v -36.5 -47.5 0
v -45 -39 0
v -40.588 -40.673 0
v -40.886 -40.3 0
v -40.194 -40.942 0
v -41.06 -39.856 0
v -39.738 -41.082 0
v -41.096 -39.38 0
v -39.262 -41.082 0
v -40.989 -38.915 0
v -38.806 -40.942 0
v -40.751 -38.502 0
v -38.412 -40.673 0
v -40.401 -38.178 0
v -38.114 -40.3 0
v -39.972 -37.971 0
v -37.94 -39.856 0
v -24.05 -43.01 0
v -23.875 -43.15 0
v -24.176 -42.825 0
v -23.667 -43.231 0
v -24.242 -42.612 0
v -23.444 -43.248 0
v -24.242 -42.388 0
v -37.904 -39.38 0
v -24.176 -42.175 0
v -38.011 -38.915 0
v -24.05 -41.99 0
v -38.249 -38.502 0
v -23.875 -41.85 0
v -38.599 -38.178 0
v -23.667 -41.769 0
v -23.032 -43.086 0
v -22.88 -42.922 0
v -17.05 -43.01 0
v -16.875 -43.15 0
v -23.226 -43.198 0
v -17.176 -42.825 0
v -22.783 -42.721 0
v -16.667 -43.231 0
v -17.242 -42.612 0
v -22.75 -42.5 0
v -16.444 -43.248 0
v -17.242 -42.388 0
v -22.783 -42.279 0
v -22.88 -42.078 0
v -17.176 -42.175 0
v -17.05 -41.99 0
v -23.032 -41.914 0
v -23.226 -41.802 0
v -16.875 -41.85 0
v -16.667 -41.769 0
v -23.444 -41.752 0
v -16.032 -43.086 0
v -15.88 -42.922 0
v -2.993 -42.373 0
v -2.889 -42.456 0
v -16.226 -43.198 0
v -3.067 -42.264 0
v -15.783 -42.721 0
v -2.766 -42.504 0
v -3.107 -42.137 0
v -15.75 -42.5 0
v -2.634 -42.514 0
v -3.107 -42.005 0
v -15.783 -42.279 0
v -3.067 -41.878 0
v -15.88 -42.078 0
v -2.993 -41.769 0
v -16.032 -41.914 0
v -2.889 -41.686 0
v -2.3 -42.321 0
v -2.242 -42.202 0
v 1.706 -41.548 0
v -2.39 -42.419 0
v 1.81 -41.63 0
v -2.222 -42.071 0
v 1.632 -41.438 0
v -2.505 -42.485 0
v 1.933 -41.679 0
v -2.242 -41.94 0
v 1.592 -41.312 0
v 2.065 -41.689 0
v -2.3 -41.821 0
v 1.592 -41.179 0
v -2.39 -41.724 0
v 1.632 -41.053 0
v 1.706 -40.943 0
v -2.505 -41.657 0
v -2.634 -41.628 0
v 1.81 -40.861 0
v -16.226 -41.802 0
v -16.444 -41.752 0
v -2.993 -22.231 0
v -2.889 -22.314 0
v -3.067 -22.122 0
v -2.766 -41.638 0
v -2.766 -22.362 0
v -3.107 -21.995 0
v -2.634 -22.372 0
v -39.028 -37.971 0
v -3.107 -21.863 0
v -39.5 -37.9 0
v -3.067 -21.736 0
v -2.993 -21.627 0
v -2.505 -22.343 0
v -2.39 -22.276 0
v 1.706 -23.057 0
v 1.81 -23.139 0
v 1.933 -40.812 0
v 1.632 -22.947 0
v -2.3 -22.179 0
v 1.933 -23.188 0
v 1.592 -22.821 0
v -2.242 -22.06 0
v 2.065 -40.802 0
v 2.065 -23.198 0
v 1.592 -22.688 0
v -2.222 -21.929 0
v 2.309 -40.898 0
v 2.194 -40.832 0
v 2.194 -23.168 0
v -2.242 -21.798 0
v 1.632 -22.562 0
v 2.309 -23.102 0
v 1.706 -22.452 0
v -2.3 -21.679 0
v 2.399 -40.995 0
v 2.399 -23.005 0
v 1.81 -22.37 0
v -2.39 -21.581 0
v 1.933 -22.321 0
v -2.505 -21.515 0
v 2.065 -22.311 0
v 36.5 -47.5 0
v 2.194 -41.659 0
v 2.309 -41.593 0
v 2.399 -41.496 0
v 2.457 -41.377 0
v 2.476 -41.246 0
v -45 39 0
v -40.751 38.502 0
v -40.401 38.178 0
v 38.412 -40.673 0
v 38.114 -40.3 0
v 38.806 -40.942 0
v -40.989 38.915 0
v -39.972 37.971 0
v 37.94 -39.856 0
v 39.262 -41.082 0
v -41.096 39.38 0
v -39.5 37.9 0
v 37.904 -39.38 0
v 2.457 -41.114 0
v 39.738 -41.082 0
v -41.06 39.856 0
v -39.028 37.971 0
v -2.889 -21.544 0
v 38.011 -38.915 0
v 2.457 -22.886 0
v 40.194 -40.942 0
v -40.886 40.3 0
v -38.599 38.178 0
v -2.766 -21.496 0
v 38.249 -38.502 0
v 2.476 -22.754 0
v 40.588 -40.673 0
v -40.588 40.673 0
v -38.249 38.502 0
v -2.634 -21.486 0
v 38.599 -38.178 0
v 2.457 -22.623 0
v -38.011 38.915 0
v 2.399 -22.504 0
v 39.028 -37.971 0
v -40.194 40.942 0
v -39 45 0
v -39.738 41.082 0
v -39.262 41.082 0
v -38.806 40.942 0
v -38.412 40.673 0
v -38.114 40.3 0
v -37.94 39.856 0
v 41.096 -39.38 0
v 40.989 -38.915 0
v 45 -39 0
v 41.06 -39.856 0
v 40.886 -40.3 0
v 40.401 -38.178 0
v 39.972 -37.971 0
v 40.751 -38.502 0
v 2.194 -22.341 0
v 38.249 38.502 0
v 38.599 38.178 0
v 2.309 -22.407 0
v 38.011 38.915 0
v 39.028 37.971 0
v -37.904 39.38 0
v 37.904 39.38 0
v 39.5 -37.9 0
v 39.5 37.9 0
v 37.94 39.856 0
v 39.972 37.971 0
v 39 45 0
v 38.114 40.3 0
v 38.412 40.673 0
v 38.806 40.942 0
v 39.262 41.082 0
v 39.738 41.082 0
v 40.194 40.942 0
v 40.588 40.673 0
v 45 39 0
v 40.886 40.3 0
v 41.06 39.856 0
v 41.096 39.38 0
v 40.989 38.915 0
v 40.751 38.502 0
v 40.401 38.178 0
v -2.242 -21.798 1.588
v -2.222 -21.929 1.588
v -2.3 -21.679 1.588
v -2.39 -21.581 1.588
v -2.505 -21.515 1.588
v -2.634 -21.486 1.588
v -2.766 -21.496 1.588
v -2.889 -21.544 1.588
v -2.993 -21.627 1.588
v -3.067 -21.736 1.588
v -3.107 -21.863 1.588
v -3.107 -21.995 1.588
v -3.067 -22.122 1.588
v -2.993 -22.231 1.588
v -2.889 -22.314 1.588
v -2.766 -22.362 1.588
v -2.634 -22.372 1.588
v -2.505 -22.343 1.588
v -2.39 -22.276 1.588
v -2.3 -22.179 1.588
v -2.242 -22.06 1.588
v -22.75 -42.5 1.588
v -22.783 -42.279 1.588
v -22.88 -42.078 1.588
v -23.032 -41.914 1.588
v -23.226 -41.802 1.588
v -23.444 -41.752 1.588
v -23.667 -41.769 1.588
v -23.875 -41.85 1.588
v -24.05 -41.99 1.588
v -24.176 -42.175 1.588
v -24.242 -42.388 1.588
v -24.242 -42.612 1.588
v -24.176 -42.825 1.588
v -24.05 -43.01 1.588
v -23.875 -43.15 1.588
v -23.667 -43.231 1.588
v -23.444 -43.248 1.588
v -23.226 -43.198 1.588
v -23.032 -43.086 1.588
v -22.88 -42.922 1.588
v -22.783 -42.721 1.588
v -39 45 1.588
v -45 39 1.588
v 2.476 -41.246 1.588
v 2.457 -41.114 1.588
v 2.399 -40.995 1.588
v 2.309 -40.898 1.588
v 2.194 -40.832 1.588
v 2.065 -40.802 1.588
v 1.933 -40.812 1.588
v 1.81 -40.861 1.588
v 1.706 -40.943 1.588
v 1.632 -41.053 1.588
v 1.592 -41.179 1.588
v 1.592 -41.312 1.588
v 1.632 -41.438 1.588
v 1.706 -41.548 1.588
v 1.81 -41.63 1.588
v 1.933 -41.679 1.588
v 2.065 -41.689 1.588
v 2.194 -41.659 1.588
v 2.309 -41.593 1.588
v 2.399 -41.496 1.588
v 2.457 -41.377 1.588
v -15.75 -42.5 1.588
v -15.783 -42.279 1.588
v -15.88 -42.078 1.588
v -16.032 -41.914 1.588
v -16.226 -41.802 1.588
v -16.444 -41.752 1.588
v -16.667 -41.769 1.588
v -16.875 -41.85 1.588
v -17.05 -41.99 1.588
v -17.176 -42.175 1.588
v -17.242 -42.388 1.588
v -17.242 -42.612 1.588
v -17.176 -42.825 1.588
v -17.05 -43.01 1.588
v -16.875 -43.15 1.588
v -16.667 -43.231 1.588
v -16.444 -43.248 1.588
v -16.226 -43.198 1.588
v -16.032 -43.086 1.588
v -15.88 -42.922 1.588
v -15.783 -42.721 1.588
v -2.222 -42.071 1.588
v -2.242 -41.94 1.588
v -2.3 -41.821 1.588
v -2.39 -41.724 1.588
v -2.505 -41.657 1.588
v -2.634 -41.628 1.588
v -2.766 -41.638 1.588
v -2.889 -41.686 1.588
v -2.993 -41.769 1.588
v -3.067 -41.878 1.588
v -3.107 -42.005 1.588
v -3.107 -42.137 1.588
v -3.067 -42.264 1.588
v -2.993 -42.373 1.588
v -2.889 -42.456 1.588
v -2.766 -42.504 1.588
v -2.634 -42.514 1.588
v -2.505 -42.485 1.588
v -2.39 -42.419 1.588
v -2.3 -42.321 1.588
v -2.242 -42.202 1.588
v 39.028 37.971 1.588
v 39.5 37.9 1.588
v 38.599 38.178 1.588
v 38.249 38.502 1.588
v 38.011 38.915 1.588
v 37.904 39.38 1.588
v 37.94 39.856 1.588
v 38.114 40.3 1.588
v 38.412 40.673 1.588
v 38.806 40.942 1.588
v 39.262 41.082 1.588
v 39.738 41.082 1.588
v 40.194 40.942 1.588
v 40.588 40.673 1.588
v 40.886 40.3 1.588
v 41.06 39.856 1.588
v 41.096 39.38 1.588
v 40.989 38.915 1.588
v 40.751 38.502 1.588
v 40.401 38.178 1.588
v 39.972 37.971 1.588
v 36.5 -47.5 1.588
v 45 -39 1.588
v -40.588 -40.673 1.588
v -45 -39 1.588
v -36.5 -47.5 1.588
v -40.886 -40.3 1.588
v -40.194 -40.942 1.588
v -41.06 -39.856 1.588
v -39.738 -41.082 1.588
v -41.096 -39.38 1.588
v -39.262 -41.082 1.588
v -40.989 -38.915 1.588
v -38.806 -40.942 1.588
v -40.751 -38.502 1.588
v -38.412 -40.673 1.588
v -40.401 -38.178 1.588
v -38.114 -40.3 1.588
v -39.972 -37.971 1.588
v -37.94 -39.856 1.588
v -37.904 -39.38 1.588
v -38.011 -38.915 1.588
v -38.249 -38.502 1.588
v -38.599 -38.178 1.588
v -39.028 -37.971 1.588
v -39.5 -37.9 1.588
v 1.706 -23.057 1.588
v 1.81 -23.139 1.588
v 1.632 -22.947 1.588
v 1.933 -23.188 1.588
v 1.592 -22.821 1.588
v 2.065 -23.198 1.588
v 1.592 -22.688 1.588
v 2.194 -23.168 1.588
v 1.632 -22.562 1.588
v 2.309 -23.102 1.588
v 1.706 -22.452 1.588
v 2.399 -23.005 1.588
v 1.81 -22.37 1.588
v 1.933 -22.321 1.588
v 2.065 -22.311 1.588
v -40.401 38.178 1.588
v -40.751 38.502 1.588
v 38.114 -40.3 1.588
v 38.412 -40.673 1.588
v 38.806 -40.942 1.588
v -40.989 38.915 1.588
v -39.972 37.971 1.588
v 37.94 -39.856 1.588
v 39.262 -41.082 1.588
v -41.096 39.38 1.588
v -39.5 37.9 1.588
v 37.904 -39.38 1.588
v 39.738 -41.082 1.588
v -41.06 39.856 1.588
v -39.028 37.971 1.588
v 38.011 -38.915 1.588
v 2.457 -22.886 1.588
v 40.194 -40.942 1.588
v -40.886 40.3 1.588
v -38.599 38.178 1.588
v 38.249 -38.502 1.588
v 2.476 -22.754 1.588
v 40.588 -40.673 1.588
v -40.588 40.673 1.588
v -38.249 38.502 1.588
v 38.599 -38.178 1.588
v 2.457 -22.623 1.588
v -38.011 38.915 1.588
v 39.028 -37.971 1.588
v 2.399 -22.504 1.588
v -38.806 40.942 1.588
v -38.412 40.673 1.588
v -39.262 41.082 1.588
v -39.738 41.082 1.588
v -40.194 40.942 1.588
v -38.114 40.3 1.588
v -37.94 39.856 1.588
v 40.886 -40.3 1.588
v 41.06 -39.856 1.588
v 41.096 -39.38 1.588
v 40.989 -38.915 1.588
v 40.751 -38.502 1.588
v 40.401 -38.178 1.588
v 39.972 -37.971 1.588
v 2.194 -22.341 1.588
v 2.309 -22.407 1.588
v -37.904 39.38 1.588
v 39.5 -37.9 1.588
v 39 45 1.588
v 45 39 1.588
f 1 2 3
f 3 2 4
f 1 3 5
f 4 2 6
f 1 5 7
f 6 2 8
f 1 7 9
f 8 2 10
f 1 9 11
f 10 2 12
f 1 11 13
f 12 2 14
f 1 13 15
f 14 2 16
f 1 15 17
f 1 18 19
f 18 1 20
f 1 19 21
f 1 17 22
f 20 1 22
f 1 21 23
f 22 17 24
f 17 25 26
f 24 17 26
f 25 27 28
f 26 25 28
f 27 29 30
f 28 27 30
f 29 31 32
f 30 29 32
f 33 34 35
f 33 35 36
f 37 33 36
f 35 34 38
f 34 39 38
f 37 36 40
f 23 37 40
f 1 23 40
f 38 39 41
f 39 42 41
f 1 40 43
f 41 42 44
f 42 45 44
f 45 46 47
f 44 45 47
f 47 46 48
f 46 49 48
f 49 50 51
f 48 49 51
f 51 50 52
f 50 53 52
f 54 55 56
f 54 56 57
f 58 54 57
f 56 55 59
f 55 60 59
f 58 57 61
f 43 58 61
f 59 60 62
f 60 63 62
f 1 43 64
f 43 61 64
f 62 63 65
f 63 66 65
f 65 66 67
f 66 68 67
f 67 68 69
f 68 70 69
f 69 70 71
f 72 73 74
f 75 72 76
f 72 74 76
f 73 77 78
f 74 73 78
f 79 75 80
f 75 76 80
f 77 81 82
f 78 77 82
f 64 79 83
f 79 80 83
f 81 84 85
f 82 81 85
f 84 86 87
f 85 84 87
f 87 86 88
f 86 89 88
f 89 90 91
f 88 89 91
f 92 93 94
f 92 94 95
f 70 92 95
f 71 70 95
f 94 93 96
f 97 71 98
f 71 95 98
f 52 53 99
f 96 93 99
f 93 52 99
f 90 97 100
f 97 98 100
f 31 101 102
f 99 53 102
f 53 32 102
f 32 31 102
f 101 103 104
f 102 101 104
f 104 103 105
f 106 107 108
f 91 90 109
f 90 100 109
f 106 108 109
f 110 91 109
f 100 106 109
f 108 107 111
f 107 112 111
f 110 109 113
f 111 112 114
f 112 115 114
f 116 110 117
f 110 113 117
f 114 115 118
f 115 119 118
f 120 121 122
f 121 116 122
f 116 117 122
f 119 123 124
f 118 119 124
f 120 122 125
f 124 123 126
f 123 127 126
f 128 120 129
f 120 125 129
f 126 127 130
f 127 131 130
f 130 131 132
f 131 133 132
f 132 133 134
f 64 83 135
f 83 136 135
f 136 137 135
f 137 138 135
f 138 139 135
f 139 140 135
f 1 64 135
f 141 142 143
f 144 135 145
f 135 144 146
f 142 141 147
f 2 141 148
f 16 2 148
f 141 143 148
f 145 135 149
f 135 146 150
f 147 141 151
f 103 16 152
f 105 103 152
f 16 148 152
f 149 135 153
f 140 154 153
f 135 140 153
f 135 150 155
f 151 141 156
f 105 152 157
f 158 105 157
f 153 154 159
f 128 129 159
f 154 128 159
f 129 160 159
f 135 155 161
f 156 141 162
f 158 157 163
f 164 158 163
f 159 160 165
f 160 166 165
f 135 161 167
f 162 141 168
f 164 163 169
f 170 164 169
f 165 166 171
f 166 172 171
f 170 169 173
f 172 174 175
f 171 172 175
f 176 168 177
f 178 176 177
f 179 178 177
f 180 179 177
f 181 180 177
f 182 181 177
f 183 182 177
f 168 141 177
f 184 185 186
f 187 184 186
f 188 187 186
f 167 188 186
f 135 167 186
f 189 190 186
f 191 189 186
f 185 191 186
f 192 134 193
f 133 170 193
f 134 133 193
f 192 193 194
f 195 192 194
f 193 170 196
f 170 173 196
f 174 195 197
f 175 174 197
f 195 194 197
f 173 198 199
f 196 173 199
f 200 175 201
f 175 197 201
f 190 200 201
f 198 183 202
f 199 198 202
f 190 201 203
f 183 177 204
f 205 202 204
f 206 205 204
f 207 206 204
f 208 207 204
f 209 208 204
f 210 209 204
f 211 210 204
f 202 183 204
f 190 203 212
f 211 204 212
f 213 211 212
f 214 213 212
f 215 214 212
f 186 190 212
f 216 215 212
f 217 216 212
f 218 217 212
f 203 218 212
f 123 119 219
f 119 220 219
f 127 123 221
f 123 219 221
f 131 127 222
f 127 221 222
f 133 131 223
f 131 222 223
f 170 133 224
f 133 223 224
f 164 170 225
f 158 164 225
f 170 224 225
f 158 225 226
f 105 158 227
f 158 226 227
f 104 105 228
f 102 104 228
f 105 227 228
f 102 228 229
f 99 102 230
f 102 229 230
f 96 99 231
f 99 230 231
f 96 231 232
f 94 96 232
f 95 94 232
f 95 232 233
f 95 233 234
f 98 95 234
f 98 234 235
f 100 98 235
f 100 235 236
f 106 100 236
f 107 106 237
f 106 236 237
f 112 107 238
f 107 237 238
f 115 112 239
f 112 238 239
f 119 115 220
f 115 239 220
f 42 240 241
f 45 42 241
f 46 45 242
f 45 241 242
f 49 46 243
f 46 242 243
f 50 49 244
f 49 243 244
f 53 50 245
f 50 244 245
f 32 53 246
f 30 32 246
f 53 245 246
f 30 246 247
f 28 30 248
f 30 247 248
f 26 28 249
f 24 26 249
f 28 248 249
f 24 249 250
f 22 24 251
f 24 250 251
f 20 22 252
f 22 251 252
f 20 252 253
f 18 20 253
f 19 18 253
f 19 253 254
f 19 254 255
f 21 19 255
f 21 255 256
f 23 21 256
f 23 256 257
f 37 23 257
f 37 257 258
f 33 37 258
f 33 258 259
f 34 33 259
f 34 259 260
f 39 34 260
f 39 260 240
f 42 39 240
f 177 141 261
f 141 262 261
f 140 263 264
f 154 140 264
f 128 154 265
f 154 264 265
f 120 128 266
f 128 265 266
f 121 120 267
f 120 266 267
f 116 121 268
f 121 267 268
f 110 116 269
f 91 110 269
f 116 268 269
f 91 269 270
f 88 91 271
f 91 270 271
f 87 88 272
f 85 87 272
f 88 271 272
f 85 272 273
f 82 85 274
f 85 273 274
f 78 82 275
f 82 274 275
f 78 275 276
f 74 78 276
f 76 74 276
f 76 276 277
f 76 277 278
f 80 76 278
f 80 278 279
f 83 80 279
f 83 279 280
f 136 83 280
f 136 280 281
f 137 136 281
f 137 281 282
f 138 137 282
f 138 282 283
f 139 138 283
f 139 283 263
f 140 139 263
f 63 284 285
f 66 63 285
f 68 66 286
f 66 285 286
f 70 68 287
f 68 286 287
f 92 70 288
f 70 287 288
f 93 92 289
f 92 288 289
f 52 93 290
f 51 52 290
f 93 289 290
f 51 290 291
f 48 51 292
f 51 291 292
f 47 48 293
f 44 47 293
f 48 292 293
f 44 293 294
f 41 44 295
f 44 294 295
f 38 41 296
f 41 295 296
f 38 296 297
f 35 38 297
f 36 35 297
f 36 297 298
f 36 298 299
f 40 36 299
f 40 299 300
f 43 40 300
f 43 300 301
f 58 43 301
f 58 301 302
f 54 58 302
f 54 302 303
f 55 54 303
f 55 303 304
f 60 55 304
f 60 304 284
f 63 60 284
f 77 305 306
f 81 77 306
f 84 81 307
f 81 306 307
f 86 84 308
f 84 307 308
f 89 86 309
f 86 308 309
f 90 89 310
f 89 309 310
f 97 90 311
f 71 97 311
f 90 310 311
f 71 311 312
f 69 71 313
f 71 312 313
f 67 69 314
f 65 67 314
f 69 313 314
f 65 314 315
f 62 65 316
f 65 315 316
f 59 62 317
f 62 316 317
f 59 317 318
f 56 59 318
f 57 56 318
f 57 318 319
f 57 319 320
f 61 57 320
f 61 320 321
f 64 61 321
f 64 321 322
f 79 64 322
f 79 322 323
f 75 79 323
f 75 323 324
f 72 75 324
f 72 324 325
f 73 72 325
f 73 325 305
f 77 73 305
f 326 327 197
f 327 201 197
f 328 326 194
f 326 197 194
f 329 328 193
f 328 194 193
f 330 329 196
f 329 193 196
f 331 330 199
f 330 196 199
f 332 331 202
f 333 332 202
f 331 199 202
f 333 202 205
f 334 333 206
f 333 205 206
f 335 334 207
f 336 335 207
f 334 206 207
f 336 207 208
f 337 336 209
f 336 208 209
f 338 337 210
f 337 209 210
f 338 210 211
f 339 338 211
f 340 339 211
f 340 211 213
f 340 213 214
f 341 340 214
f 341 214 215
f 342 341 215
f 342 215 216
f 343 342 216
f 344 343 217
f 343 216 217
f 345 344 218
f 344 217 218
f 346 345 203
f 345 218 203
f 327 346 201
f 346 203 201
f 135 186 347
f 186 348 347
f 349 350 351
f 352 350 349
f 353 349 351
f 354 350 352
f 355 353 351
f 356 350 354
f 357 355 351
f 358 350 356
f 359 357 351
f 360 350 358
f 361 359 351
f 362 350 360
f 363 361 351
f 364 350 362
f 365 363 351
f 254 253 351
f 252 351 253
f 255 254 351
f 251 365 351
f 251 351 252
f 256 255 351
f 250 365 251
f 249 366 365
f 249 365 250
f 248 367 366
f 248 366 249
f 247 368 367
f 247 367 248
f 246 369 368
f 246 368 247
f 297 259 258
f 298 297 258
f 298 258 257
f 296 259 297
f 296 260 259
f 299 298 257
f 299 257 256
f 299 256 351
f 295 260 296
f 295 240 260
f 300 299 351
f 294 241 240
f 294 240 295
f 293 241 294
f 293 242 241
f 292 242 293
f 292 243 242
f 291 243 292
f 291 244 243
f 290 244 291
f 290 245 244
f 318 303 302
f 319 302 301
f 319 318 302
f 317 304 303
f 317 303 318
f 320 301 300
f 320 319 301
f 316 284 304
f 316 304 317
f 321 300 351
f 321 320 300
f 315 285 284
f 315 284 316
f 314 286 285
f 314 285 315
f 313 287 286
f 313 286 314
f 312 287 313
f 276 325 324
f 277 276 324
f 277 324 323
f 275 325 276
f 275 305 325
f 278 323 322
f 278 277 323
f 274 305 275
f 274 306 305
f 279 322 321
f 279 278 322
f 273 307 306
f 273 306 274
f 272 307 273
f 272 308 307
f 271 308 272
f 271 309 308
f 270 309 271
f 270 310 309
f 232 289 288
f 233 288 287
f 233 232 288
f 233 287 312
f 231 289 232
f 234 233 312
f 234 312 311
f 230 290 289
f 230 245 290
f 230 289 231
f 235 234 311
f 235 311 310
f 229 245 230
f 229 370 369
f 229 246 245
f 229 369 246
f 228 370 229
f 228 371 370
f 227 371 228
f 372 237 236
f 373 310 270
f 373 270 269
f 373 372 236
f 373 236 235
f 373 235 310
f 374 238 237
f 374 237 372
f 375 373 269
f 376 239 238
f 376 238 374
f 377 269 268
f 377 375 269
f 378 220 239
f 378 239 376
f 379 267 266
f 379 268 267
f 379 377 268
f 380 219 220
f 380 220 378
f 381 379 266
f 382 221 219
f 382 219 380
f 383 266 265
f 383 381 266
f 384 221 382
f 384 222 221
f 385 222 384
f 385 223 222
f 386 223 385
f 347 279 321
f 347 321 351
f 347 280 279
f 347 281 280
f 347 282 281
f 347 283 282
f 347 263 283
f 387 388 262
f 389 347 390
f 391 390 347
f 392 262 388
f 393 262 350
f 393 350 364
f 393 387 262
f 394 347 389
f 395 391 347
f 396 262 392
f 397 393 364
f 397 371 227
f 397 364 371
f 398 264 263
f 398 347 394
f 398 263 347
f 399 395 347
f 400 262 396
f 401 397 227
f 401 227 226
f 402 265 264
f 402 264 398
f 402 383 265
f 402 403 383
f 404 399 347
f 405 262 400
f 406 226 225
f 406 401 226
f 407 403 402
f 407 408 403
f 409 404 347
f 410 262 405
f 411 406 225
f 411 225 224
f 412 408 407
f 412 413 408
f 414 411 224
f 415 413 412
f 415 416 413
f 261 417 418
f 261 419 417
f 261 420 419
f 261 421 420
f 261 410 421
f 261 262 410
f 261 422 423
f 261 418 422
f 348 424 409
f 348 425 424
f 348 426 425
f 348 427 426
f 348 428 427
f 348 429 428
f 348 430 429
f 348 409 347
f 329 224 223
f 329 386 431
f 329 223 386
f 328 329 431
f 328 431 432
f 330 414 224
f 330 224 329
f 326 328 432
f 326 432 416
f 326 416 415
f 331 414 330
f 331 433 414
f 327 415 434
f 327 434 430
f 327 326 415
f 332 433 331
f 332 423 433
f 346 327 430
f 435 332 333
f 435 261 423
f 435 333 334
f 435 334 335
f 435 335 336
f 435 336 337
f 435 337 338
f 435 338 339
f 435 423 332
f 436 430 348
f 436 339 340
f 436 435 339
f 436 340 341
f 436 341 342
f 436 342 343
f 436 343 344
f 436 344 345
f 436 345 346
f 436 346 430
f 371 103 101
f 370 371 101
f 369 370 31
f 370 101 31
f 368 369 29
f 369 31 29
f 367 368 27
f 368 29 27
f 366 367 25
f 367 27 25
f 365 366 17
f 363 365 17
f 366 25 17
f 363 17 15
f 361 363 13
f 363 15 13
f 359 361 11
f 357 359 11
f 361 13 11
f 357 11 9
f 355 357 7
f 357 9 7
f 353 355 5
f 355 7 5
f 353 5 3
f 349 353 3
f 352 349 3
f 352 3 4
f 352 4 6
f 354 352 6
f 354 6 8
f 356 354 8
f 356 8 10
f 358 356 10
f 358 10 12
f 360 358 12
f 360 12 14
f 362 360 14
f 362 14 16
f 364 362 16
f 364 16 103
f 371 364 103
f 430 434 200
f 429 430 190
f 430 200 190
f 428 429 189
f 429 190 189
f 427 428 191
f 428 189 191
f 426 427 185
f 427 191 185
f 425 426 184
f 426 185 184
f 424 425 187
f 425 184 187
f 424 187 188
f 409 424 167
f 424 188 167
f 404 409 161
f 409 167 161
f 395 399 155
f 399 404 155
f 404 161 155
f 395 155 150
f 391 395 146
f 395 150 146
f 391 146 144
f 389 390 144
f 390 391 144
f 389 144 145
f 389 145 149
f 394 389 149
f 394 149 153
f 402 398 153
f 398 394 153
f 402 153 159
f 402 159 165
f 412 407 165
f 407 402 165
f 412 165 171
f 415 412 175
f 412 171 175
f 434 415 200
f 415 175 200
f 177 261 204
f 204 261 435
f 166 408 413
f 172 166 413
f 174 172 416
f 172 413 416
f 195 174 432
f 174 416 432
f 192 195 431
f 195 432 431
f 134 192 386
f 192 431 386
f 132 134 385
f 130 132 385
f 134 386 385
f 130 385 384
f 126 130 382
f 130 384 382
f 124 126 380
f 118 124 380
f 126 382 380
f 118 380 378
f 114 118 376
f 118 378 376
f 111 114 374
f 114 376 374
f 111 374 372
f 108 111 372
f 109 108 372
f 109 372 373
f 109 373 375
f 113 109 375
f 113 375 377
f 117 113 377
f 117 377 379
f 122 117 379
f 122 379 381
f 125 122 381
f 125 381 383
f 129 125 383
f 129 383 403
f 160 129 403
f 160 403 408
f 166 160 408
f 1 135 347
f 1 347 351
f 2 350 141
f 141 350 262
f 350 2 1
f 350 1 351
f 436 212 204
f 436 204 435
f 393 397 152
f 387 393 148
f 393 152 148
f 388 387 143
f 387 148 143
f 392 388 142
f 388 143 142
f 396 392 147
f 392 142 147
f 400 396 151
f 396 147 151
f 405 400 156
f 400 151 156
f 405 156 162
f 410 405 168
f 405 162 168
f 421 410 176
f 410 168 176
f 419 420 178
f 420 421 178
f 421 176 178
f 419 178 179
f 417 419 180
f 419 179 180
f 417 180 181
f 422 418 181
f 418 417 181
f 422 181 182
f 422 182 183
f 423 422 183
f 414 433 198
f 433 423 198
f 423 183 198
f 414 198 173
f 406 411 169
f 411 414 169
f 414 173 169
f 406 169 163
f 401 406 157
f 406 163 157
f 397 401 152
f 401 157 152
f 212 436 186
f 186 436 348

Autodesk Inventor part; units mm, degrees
sketch "AL_spacer_contact_Zminus" plane through (0, 0, 0) normal (0, 0, 1) x (1, 0, 0)
  circle A0 centre (39.5, 39.5) radius 3.175
  circle A1 centre (39.5, -39.5) radius 3.175
  circle A2 centre (-39.5, -39.5) radius 3.175
  circle A3 centre (-39.5, 39.5) radius 3.175
  point P0 (0, 0)
  dimension "d228" = 39.5
  dimension "d229" = 39.5
  dimension "d230" = 39.5
  dimension "d231" = 39.5
  dimension "d232" = 39.5
  dimension "d233" = 39.5
  dimension "d234" = 39.5
  dimension "d235" = 39.5
  dimension "d236" = 6.35
sketch "Delrin_stayout_Zminus" plane through (0, 0, 0) normal (0, 0, 1) x (1, 0, 0)
  line L0 (47.5, 39.5) -> (47.5, 31)
  line L1 (47.5, 31) -> (39.5, 31)
  line L2 (39.5, 31) -> (31, 39.5)
  line L3 (31, 39.5) -> (31, 47.5)
  line L4 (31, 47.5) -> (39.5, 47.5)
  line L5 (39.5, 47.5) -> (47.5, 39.5)
  line L6 (-39.5, 47.5) -> (-47.5, 39.5)
  line L7 (-47.5, 39.5) -> (-47.5, 31)
  line L8 (-47.5, 31) -> (-39.5, 31)
  line L9 (-39.5, 31) -> (-31, 39.5)
  line L10 (-31, 39.5) -> (-31, 47.5)
  line L11 (-31, 47.5) -> (-39.5, 47.5)
  line L12 (47.5, -39.5) -> (39.5, -47.5)
  line L13 (39.5, -47.5) -> (31, -47.5)
  line L14 (31, -47.5) -> (31, -39.5)
  line L15 (31, -39.5) -> (39.5, -31)
  line L16 (39.5, -31) -> (47.5, -31)
  line L17 (47.5, -31) -> (47.5, -39.5)
  line L18 (-39.5, -47.5) -> (-47.5, -39.5)
  line L19 (-47.5, -39.5) -> (-47.5, -31)
  line L20 (-47.5, -31) -> (-39.5, -31)
  line L21 (-39.5, -31) -> (-31, -39.5)
  line L22 (-31, -39.5) -> (-31, -47.5)
  line L23 (-31, -47.5) -> (-39.5, -47.5)
  point P0 (0, 0)
  dimension "d243" = 16.5
  dimension "d244" = 8
  dimension "d245" = 8.5
  dimension "d246" = 16.5
  dimension "d247" = 47.5
  dimension "d248" = 47.5
  dimension "d249" = 47.5
  dimension "d250" = 47.5
  dimension "d251" = 47.5
  dimension "d252" = 47.5
  dimension "d253" = 47.5
  dimension "d254" = 47.5
sketch "Nub_stayout_Zminus" plane through (0, 0, 0) normal (0, 0, 1) x (1, 0, 0)
  line L0 (29, 47.5) -> (39.5, 47.5)
  line L1 (39.5, 47.5) -> (47.5, 39.5)
  line L2 (47.5, 39.5) -> (47.5, 29)
  line L3 (47.5, 29) -> (42, 29)
  line L4 (42, 29) -> (42, 40.4125)
  line L5 (40.4125, 42) -> (29, 42)
  line L6 (29, 42) -> (29, 47.5)
  arc A0 (42, 40.4125) -> (40.4125, 42) centre (40.4125, 40.4125) ccw
  line L7 (-29, 47.5) -> (-39.5, 47.5)
  line L8 (-39.5, 47.5) -> (-47.5, 39.5)
  line L9 (-47.5, 39.5) -> (-47.5, 29)
  line L10 (-47.5, 29) -> (-42, 29)
  line L11 (-42, 29) -> (-42, 40.4125)
  line L12 (-40.4125, 42) -> (-29, 42)
  line L13 (-29, 42) -> (-29, 47.5)
  arc A1 (-40.4125, 42) -> (-42, 40.4125) centre (-40.4125, 40.4125) ccw
  line L14 (-47.5, -29) -> (-42, -29)
  line L15 (-42, -29) -> (-42, -40.4125)
  line L16 (-40.4125, -42) -> (-29, -42)
  line L17 (-29, -42) -> (-29, -47.5)
  line L18 (-29, -47.5) -> (-39.5, -47.5)
  line L19 (-39.5, -47.5) -> (-47.5, -39.5)
  line L20 (-47.5, -39.5) -> (-47.5, -29)
  arc A2 (-42, -40.4125) -> (-40.4125, -42) centre (-40.4125, -40.4125) ccw
  line L21 (47.5, -29) -> (42, -29)
  line L22 (42, -29) -> (42, -40.4125)
  line L23 (40.4125, -42) -> (29, -42)
  line L24 (29, -42) -> (29, -47.5)
  line L25 (29, -47.5) -> (39.5, -47.5)
  line L26 (39.5, -47.5) -> (47.5, -39.5)
  line L27 (47.5, -39.5) -> (47.5, -29)
  arc A3 (40.4125, -42) -> (42, -40.4125) centre (40.4125, -40.4125) ccw
  point P0 (0, 0)
  dimension "d255" = 1.5875
  dimension "d256" = 18.5
  dimension "d257" = 8
  dimension "d258" = 5.5
  dimension "d259" = 47.5
  dimension "d260" = 47.5
  dimension "d264" = 1.5875
  dimension "d265" = 47.5
  dimension "d266" = 47.5
  dimension "d267" = 1.5875
  dimension "d268" = 47.5
  dimension "d269" = 47.5
  dimension "d270" = 1.5875
  dimension "d271" = 47.5
  dimension "d272" = 47.5
ref_plane "Zplus_face" through (0, 0, 1.5875) normal (0, 0, 1) x (1, 0, 0)
sketch "AL_spacer_contact_Zplus" plane through (0, 0, 1.5875) normal (0, 0, 1) x (1, 0, 0)
  circle A0 centre (-39.5, 39.5) radius 3.175
  circle A1 centre (-39.5, -39.5) radius 3.175
  circle A2 centre (39.5, -39.5) radius 3.175
  circle A3 centre (39.5, 39.5) radius 3.175
  point P0 (0, 0)
  dimension "d129" = 39.5
  dimension "d130" = 39.5
  dimension "d131" = 39.5
  dimension "d132" = 39.5
  dimension "d133" = 6.35
sketch "Delrin_stayout_Zplus" plane through (0, 0, 1.5875) normal (0, 0, 1) x (1, 0, 0)
  line L0 (47.5, -31) -> (47.5, -39.5)
  line L1 (47.5, -39.5) -> (39.5, -47.5)
  line L2 (39.5, -47.5) -> (31, -47.5)
  line L3 (31, -47.5) -> (31, -39.5)
  line L4 (31, -39.5) -> (39.5, -31)
  line L5 (39.5, -31) -> (47.5, -31)
  line L6 (47.5, 31) -> (47.5, 39.5)
  line L7 (47.5, 39.5) -> (39.5, 47.5)
  line L8 (39.5, 47.5) -> (31, 47.5)
  line L9 (31, 47.5) -> (31, 39.5)
  line L10 (31, 39.5) -> (39.5, 31)
  line L11 (39.5, 31) -> (47.5, 31)
  line L12 (-39.5, 47.5) -> (-47.5, 39.5)
  line L13 (-47.5, 39.5) -> (-47.5, 31)
  line L14 (-47.5, 31) -> (-39.5, 31)
  line L15 (-39.5, 31) -> (-31, 39.5)
  line L16 (-31, 39.5) -> (-31, 47.5)
  line L17 (-31, 47.5) -> (-39.5, 47.5)
  line L18 (-47.5, -39.5) -> (-39.5, -47.5)
  line L19 (-39.5, -47.5) -> (-31, -47.5)
  line L20 (-31, -47.5) -> (-31, -39.5)
  line L21 (-31, -39.5) -> (-39.5, -31)
  line L22 (-39.5, -31) -> (-47.5, -31)
  line L23 (-47.5, -31) -> (-47.5, -39.5)
  point P0 (0, 0)
  dimension "d115" = 16.5
  dimension "d116" = 16.5
  dimension "d117" = 8
  dimension "d118" = 8.5
  dimension "d121" = 47.5
  dimension "d122" = 47.5
  dimension "d123" = 47.5
  dimension "d124" = 47.5
  dimension "d125" = 47.5
  dimension "d126" = 47.5
  dimension "d127" = 47.5
  dimension "d128" = 47.5
sketch "Nub_stayout_Zplus" plane through (0, 0, 1.5875) normal (0, 0, 1) x (1, 0, 0)
  line L0 (47.5, 29) -> (42, 29)
  line L1 (42, 29) -> (42, 40.4125)
  line L2 (40.4125, 42) -> (29, 42)
  line L3 (29, 42) -> (29, 47.5)
  arc A0 (42, 40.4125) -> (40.4125, 42) centre (40.4125, 40.4125) ccw
  line L4 (29, 47.5) -> (39.5, 47.5)
  line L5 (39.5, 47.5) -> (47.5, 39.5)
  line L6 (47.5, 39.5) -> (47.5, 29)
  line L7 (-39.5, 47.5) -> (-29, 47.5)
  line L8 (-29, 47.5) -> (-29, 42)
  line L9 (-29, 42) -> (-40.4125, 42)
  line L10 (-42, 40.4125) -> (-42, 29)
  line L11 (-42, 29) -> (-47.5, 29)
  line L12 (-47.5, 29) -> (-47.5, 39.5)
  line L13 (-47.5, 39.5) -> (-39.5, 47.5)
  arc A1 (-40.4125, 42) -> (-42, 40.4125) centre (-40.4125, 40.4125) ccw
  line L14 (-47.5, -29) -> (-47.5, -39.5)
  line L15 (-47.5, -39.5) -> (-39.5, -47.5)
  line L16 (-39.5, -47.5) -> (-29, -47.5)
  line L17 (-29, -47.5) -> (-29, -42)
  line L18 (-29, -42) -> (-40.4125, -42)
  line L19 (-42, -40.4125) -> (-42, -29)
  line L20 (-42, -29) -> (-47.5, -29)
  arc A2 (-42, -40.4125) -> (-40.4125, -42) centre (-40.4125, -40.4125) ccw
  line L21 (29, -47.5) -> (39.5, -47.5)
  line L22 (39.5, -47.5) -> (47.5, -39.5)
  line L23 (47.5, -39.5) -> (47.5, -29)
  line L24 (47.5, -29) -> (42, -29)
  line L25 (42, -29) -> (42, -40.4125)
  line L26 (40.4125, -42) -> (29, -42)
  line L27 (29, -42) -> (29, -47.5)
  arc A3 (40.4125, -42) -> (42, -40.4125) centre (40.4125, -40.4125) ccw
  point P0 (0, 0)
  dimension "d146" = 1.5875
  dimension "d147" = 5.5
  dimension "d149" = 18.5
  dimension "d150" = 8
  dimension "d151" = 47.5
  dimension "d152" = 47.5
  dimension "d153" = 1.5875
  dimension "d154" = 47.5
  dimension "d155" = 47.5
  dimension "d156" = 1.5875
  dimension "d157" = 47.5
  dimension "d158" = 47.5
  dimension "d159" = 1.5875
  dimension "d160" = 47.5
  dimension "d161" = 47.5
sketch "Sketch1" plane through (0, 0, 0) normal (0, 0, 1) x (1, 0, 0)
  line L0 (-47.5, 47.5) -> (47.5, 47.5)
  line L1 (47.5, 47.5) -> (47.5, -47.5)
  line L2 (47.5, -47.5) -> (-47.5, -47.5)
  line L3 (-47.5, -47.5) -> (-47.5, 47.5)
  point P0 (0, 0)
  dimension "d0" = 95
  dimension "d1" = 95
  dimension "d2" = 47.5
  dimension "d3" = 47.5
extrude "Extrusion1" add sketch "Sketch1" along normal blind 1.5875
chamfer "Chamfer2" distance 11 angle 45 2 edges at (-47.5, -47.5, 0.7937) (47.5, 47.5, 0.7937)
ref_plane "Work Plane_ConnX" through (-32, 0, 0) normal (1, 0, 0) x (0, 1, 0)
ref_plane "Work Plane_ConnY" through (0, 0, 0) normal (0, 1, 0) x (-1, 0, 0)
sketch "Sketch9" plane through (0, 0, 1.5875) normal (0, 0, 1) x (1, 0, 0)
  line L0 (47.5, 47.5) -> (47.5, -47.5) projected
  line L1 (58.5598, -32) -> (-58.5598, -32)
  circle A0 centre (-2.667, -21.9289) radius 0.4445
  circle A1 centre (-2.667, -42.0711) radius 0.4445
  line L2 (0, 26.5598) -> (0, -90.5598) construction
  point P0 (0, 0)
  point P1 (0, -32)
  dimension "d134" = 20.1422
  dimension "d136" = 2.667
  dimension "d138" = 0.889
  dimension "d141" = 180
  dimension "d350" = 32
  dimension "d351" = 0
extrude "Holes_Conn_Zminus" cut sketch "Sketch9" against normal through all
sketch "Sketch22" plane through (0, 0, 1.5875) normal (0, 0, 1) x (1, 0, 0)
  line L0 (47.5, 36.5) -> (47.5, -47.5) projected
  line L1 (0, -1.0026) -> (0, -62.9974) construction
  line L2 (62.8115, -32) -> (-62.8115, -32)
  circle A0 centre (2.032, -22.7545) radius 0.4445
  circle A1 centre (2.032, -41.2455) radius 0.4445
  point P0 (47.5, -36.5)
  point P1 (0, 0)
  point P2 (0, -32)
  dimension "d282" = 180
  dimension "d283" = 18.491
  dimension "d284" = 0.889
  dimension "d285" = 2.032
  dimension "d352" = 32
  dimension "d353" = 0
extrude "Holes_Conn_Zplus" cut sketch "Sketch22" against normal through all
hole "Hole5" at (39.5, 39.5, 1.5875) direction (0, 0, -1) diameter 3.2 end through all
mirror "Mirror5" about plane through (0, 0, 0) normal (1, 0, 0) of "Hole5"
mirror "Mirror6" about plane through (0, 0, 0) normal (0, 1, 0) of "Hole5", "Mirror5"
sketch "Sketch25" plane through (0, 0, 1.5875) normal (0, 0, 1) x (1, 0, 0)
  circle A0 centre (-39.5, -39.5) radius 1.6 projected
  circle A1 centre (39.5, -39.5) radius 1.6 projected
  circle A2 centre (-39.5, 39.5) radius 1.6 projected
  circle A3 centre (39.5, 39.5) radius 1.6 projected
  line L0 (47.5, -47.5) -> (-36.5, -47.5) projected
  line L1 (0, 0) -> (0, -59.2198)
  line L2 (8, -47.5) -> (8, -15.5)
  line L3 (8, -15.5) -> (-8, -15.5)
  line L4 (-8, -15.5) -> (-8, -47.5)
  line L5 (-8, -47.5) -> (-62.7516, -61.7336)
  line L6 (-62.7516, -61.7336) -> (-64.2933, 68.2222)
  line L7 (-64.2933, 68.2222) -> (58.3572, 62.5728)
  line L8 (58.3572, 62.5728) -> (56.5848, -69.017)
  line L9 (56.5848, -69.017) -> (8, -47.5)
  point P0 (36.5, -47.5)
  dimension "d362" = 16
  dimension "d363" = 32
extrude "Extrusion9" [suppressed]
sketch "Sketch26" plane through (0, 0, 1.5875) normal (0, 0, 1) x (1, 0, 0)
  line L0 (47.5, -47.5) -> (-36.5, -47.5) projected
  circle A0 centre (-23.5, -42.5) radius 0.75
  circle A1 centre (-16.5, -42.5) radius 0.75
  line L1 (-20, -36.5) -> (-20, -45.5063)
  point P0 (36.5, -47.5)
  point P1 (0, 0)
  point P2 (-20, -42.5)
  dimension "d366" = 1.5
  dimension "d367" = 7
  dimension "d368" = 5
  dimension "d369" = 20
extrude "Extrusion10" cut sketch "Sketch26" against normal through all
sketch "Sketch27" plane through (0, 0, 1.5875) normal (0, 0, 1) x (1, 0, 0)
  line L0 (47.5, -47.5) -> (47, -47.5)
  line L1 (47, -47.5) -> (47, -40.5)
  line L2 (47.5, -39.338) -> (47.5, -47.5)
  arc A0 (47.5, -39.338) -> (47, -40.5) centre (48.6002, -40.5) ccw
  line L3 (-47.5, 47.5) -> (-47, 47.5)
  line L4 (-47, 47.5) -> (-47, 40.5)
  line L5 (-47.5, 39.338) -> (-47.5, 47.5)
  arc A1 (-47.5, 39.338) -> (-47, 40.5) centre (-48.6002, 40.5) ccw
  point P0 (0, 0)
  dimension "d372" = 1.6002
  dimension "d373" = 0.5
  dimension "d374" = 7
extrude "Extrusion11" cut sketch "Sketch27" against normal through all
chamfer "Chamfer4" [suppressed]
sketch "Sketch37" plane through (0, 0, 1.5875) normal (0, 0, 1) x (1, 0, 0)
  line L0 (-47.5, -36.5) -> (-47.5, 39.338) projected
  line L1 (47, -47.5) -> (-36.5, -47.5) projected
  line L2 (47.5, 36.5) -> (47.5, -39.338) projected
  line L3 (-47, 47.5) -> (36.5, 47.5) projected
  line L4 (-47.5, 47.5) -> (47.5, 47.5) construction
  line L5 (47.5, 47.5) -> (47.5, -47.5) construction
  line L6 (47.5, -47.5) -> (-47.5, -47.5) construction
  line L7 (-47.5, -47.5) -> (-47.5, 47.5) construction
  point P0 (0, 0)
decal "Decal4"
sketch "Sketch38" plane through (0, 0, 0) normal (0, 0, -1) x (-1, 0, 0)
  line L0 (47, 47.5) -> (-36.5, 47.5) projected
  line L1 (-47.5, 36.5) -> (-47.5, -39.338) projected
  line L2 (-47, -47.5) -> (36.5, -47.5) projected
  line L3 (47.5, -36.5) -> (47.5, 39.338) projected
  line L4 (-47.5, 47.5) -> (47.5, 47.5) construction
  line L5 (47.5, 47.5) -> (47.5, -47.5) construction
  line L6 (47.5, -47.5) -> (-47.5, -47.5) construction
  line L7 (-47.5, -47.5) -> (-47.5, 47.5) construction
  point P0 (0, 0)
decal "Decal5"
sketch "Sketch34" plane through (0, 0, 1.5875) normal (0, 0, 1) x (1, 0, 0)
  arc A0 (-47.5, 39.338) -> (-47, 40.5) centre (-48.6002, 40.5) ccw projected
  line L0 (-47.5, -36.5) -> (-47.5, 39.338) projected
  line L1 (47, -47.5) -> (-36.5, -47.5) projected
  line L2 (47, -47.5) -> (47, -40.5) projected
  arc A1 (47.5, -39.338) -> (47, -40.5) centre (48.6002, -40.5) ccw projected
  line L3 (47.5, 36.5) -> (47.5, -39.338) projected
  line L4 (-47, 47.5) -> (-47, 40.5) projected
  line L5 (-47.5, 36.5) -> (-36.5, 47.5)
  line L6 (-47.5, 36.5) -> (-47.5, 47.5)
  line L7 (-47.5, 47.5) -> (-36.5, 47.5)
  line L8 (47.5, -36.5) -> (36.5, -47.5)
  line L9 (47.5, -47.5) -> (47.5, -36.5)
  line L10 (36.5, -47.5) -> (47.5, -47.5)
  point P0 (0, 0)
  dimension "d438" = 11
  dimension "d439" = 11
extrude "Extrusion14" cut sketch "Sketch34" against normal through all contours L6 L7 L4 A0 | A0 L4 L7 L5 L0 | L1 L8 L3 A1 L2
sketch "Sketch35" plane through (0, 0, 1.5875) normal (0, 0, 1) x (1, 0, 0)
  line L0 (36.5, -47.5) -> (47.5, -36.5) projected
  line L1 (47.5, 36.5) -> (47.5, -39.338) projected
  line L2 (36.5, 47.5) -> (47.5, 36.5) projected
  line L3 (-47, 47.5) -> (36.5, 47.5) projected
  line L4 (-36.5, 47.5) -> (-47.5, 36.5) projected
  line L5 (-47.5, -36.5) -> (-47.5, 39.338) projected
  line L6 (-36.5, -47.5) -> (-47.5, -36.5) projected
  line L7 (-45, -39) -> (-45, 39)
  line L8 (-39, 45) -> (39, 45)
  line L9 (45, 39) -> (45, -39)
  point P0 (0, 0)
  dimension "d442" = 45
  dimension "d443" = 45
  dimension "d444" = 45
extrude "Extrusion15" cut sketch "Sketch35" against normal through all
equation "\"DESCRIPTION\" = 0.1"
properties part number "PCB_LT_RX-TX" material "FR4"
